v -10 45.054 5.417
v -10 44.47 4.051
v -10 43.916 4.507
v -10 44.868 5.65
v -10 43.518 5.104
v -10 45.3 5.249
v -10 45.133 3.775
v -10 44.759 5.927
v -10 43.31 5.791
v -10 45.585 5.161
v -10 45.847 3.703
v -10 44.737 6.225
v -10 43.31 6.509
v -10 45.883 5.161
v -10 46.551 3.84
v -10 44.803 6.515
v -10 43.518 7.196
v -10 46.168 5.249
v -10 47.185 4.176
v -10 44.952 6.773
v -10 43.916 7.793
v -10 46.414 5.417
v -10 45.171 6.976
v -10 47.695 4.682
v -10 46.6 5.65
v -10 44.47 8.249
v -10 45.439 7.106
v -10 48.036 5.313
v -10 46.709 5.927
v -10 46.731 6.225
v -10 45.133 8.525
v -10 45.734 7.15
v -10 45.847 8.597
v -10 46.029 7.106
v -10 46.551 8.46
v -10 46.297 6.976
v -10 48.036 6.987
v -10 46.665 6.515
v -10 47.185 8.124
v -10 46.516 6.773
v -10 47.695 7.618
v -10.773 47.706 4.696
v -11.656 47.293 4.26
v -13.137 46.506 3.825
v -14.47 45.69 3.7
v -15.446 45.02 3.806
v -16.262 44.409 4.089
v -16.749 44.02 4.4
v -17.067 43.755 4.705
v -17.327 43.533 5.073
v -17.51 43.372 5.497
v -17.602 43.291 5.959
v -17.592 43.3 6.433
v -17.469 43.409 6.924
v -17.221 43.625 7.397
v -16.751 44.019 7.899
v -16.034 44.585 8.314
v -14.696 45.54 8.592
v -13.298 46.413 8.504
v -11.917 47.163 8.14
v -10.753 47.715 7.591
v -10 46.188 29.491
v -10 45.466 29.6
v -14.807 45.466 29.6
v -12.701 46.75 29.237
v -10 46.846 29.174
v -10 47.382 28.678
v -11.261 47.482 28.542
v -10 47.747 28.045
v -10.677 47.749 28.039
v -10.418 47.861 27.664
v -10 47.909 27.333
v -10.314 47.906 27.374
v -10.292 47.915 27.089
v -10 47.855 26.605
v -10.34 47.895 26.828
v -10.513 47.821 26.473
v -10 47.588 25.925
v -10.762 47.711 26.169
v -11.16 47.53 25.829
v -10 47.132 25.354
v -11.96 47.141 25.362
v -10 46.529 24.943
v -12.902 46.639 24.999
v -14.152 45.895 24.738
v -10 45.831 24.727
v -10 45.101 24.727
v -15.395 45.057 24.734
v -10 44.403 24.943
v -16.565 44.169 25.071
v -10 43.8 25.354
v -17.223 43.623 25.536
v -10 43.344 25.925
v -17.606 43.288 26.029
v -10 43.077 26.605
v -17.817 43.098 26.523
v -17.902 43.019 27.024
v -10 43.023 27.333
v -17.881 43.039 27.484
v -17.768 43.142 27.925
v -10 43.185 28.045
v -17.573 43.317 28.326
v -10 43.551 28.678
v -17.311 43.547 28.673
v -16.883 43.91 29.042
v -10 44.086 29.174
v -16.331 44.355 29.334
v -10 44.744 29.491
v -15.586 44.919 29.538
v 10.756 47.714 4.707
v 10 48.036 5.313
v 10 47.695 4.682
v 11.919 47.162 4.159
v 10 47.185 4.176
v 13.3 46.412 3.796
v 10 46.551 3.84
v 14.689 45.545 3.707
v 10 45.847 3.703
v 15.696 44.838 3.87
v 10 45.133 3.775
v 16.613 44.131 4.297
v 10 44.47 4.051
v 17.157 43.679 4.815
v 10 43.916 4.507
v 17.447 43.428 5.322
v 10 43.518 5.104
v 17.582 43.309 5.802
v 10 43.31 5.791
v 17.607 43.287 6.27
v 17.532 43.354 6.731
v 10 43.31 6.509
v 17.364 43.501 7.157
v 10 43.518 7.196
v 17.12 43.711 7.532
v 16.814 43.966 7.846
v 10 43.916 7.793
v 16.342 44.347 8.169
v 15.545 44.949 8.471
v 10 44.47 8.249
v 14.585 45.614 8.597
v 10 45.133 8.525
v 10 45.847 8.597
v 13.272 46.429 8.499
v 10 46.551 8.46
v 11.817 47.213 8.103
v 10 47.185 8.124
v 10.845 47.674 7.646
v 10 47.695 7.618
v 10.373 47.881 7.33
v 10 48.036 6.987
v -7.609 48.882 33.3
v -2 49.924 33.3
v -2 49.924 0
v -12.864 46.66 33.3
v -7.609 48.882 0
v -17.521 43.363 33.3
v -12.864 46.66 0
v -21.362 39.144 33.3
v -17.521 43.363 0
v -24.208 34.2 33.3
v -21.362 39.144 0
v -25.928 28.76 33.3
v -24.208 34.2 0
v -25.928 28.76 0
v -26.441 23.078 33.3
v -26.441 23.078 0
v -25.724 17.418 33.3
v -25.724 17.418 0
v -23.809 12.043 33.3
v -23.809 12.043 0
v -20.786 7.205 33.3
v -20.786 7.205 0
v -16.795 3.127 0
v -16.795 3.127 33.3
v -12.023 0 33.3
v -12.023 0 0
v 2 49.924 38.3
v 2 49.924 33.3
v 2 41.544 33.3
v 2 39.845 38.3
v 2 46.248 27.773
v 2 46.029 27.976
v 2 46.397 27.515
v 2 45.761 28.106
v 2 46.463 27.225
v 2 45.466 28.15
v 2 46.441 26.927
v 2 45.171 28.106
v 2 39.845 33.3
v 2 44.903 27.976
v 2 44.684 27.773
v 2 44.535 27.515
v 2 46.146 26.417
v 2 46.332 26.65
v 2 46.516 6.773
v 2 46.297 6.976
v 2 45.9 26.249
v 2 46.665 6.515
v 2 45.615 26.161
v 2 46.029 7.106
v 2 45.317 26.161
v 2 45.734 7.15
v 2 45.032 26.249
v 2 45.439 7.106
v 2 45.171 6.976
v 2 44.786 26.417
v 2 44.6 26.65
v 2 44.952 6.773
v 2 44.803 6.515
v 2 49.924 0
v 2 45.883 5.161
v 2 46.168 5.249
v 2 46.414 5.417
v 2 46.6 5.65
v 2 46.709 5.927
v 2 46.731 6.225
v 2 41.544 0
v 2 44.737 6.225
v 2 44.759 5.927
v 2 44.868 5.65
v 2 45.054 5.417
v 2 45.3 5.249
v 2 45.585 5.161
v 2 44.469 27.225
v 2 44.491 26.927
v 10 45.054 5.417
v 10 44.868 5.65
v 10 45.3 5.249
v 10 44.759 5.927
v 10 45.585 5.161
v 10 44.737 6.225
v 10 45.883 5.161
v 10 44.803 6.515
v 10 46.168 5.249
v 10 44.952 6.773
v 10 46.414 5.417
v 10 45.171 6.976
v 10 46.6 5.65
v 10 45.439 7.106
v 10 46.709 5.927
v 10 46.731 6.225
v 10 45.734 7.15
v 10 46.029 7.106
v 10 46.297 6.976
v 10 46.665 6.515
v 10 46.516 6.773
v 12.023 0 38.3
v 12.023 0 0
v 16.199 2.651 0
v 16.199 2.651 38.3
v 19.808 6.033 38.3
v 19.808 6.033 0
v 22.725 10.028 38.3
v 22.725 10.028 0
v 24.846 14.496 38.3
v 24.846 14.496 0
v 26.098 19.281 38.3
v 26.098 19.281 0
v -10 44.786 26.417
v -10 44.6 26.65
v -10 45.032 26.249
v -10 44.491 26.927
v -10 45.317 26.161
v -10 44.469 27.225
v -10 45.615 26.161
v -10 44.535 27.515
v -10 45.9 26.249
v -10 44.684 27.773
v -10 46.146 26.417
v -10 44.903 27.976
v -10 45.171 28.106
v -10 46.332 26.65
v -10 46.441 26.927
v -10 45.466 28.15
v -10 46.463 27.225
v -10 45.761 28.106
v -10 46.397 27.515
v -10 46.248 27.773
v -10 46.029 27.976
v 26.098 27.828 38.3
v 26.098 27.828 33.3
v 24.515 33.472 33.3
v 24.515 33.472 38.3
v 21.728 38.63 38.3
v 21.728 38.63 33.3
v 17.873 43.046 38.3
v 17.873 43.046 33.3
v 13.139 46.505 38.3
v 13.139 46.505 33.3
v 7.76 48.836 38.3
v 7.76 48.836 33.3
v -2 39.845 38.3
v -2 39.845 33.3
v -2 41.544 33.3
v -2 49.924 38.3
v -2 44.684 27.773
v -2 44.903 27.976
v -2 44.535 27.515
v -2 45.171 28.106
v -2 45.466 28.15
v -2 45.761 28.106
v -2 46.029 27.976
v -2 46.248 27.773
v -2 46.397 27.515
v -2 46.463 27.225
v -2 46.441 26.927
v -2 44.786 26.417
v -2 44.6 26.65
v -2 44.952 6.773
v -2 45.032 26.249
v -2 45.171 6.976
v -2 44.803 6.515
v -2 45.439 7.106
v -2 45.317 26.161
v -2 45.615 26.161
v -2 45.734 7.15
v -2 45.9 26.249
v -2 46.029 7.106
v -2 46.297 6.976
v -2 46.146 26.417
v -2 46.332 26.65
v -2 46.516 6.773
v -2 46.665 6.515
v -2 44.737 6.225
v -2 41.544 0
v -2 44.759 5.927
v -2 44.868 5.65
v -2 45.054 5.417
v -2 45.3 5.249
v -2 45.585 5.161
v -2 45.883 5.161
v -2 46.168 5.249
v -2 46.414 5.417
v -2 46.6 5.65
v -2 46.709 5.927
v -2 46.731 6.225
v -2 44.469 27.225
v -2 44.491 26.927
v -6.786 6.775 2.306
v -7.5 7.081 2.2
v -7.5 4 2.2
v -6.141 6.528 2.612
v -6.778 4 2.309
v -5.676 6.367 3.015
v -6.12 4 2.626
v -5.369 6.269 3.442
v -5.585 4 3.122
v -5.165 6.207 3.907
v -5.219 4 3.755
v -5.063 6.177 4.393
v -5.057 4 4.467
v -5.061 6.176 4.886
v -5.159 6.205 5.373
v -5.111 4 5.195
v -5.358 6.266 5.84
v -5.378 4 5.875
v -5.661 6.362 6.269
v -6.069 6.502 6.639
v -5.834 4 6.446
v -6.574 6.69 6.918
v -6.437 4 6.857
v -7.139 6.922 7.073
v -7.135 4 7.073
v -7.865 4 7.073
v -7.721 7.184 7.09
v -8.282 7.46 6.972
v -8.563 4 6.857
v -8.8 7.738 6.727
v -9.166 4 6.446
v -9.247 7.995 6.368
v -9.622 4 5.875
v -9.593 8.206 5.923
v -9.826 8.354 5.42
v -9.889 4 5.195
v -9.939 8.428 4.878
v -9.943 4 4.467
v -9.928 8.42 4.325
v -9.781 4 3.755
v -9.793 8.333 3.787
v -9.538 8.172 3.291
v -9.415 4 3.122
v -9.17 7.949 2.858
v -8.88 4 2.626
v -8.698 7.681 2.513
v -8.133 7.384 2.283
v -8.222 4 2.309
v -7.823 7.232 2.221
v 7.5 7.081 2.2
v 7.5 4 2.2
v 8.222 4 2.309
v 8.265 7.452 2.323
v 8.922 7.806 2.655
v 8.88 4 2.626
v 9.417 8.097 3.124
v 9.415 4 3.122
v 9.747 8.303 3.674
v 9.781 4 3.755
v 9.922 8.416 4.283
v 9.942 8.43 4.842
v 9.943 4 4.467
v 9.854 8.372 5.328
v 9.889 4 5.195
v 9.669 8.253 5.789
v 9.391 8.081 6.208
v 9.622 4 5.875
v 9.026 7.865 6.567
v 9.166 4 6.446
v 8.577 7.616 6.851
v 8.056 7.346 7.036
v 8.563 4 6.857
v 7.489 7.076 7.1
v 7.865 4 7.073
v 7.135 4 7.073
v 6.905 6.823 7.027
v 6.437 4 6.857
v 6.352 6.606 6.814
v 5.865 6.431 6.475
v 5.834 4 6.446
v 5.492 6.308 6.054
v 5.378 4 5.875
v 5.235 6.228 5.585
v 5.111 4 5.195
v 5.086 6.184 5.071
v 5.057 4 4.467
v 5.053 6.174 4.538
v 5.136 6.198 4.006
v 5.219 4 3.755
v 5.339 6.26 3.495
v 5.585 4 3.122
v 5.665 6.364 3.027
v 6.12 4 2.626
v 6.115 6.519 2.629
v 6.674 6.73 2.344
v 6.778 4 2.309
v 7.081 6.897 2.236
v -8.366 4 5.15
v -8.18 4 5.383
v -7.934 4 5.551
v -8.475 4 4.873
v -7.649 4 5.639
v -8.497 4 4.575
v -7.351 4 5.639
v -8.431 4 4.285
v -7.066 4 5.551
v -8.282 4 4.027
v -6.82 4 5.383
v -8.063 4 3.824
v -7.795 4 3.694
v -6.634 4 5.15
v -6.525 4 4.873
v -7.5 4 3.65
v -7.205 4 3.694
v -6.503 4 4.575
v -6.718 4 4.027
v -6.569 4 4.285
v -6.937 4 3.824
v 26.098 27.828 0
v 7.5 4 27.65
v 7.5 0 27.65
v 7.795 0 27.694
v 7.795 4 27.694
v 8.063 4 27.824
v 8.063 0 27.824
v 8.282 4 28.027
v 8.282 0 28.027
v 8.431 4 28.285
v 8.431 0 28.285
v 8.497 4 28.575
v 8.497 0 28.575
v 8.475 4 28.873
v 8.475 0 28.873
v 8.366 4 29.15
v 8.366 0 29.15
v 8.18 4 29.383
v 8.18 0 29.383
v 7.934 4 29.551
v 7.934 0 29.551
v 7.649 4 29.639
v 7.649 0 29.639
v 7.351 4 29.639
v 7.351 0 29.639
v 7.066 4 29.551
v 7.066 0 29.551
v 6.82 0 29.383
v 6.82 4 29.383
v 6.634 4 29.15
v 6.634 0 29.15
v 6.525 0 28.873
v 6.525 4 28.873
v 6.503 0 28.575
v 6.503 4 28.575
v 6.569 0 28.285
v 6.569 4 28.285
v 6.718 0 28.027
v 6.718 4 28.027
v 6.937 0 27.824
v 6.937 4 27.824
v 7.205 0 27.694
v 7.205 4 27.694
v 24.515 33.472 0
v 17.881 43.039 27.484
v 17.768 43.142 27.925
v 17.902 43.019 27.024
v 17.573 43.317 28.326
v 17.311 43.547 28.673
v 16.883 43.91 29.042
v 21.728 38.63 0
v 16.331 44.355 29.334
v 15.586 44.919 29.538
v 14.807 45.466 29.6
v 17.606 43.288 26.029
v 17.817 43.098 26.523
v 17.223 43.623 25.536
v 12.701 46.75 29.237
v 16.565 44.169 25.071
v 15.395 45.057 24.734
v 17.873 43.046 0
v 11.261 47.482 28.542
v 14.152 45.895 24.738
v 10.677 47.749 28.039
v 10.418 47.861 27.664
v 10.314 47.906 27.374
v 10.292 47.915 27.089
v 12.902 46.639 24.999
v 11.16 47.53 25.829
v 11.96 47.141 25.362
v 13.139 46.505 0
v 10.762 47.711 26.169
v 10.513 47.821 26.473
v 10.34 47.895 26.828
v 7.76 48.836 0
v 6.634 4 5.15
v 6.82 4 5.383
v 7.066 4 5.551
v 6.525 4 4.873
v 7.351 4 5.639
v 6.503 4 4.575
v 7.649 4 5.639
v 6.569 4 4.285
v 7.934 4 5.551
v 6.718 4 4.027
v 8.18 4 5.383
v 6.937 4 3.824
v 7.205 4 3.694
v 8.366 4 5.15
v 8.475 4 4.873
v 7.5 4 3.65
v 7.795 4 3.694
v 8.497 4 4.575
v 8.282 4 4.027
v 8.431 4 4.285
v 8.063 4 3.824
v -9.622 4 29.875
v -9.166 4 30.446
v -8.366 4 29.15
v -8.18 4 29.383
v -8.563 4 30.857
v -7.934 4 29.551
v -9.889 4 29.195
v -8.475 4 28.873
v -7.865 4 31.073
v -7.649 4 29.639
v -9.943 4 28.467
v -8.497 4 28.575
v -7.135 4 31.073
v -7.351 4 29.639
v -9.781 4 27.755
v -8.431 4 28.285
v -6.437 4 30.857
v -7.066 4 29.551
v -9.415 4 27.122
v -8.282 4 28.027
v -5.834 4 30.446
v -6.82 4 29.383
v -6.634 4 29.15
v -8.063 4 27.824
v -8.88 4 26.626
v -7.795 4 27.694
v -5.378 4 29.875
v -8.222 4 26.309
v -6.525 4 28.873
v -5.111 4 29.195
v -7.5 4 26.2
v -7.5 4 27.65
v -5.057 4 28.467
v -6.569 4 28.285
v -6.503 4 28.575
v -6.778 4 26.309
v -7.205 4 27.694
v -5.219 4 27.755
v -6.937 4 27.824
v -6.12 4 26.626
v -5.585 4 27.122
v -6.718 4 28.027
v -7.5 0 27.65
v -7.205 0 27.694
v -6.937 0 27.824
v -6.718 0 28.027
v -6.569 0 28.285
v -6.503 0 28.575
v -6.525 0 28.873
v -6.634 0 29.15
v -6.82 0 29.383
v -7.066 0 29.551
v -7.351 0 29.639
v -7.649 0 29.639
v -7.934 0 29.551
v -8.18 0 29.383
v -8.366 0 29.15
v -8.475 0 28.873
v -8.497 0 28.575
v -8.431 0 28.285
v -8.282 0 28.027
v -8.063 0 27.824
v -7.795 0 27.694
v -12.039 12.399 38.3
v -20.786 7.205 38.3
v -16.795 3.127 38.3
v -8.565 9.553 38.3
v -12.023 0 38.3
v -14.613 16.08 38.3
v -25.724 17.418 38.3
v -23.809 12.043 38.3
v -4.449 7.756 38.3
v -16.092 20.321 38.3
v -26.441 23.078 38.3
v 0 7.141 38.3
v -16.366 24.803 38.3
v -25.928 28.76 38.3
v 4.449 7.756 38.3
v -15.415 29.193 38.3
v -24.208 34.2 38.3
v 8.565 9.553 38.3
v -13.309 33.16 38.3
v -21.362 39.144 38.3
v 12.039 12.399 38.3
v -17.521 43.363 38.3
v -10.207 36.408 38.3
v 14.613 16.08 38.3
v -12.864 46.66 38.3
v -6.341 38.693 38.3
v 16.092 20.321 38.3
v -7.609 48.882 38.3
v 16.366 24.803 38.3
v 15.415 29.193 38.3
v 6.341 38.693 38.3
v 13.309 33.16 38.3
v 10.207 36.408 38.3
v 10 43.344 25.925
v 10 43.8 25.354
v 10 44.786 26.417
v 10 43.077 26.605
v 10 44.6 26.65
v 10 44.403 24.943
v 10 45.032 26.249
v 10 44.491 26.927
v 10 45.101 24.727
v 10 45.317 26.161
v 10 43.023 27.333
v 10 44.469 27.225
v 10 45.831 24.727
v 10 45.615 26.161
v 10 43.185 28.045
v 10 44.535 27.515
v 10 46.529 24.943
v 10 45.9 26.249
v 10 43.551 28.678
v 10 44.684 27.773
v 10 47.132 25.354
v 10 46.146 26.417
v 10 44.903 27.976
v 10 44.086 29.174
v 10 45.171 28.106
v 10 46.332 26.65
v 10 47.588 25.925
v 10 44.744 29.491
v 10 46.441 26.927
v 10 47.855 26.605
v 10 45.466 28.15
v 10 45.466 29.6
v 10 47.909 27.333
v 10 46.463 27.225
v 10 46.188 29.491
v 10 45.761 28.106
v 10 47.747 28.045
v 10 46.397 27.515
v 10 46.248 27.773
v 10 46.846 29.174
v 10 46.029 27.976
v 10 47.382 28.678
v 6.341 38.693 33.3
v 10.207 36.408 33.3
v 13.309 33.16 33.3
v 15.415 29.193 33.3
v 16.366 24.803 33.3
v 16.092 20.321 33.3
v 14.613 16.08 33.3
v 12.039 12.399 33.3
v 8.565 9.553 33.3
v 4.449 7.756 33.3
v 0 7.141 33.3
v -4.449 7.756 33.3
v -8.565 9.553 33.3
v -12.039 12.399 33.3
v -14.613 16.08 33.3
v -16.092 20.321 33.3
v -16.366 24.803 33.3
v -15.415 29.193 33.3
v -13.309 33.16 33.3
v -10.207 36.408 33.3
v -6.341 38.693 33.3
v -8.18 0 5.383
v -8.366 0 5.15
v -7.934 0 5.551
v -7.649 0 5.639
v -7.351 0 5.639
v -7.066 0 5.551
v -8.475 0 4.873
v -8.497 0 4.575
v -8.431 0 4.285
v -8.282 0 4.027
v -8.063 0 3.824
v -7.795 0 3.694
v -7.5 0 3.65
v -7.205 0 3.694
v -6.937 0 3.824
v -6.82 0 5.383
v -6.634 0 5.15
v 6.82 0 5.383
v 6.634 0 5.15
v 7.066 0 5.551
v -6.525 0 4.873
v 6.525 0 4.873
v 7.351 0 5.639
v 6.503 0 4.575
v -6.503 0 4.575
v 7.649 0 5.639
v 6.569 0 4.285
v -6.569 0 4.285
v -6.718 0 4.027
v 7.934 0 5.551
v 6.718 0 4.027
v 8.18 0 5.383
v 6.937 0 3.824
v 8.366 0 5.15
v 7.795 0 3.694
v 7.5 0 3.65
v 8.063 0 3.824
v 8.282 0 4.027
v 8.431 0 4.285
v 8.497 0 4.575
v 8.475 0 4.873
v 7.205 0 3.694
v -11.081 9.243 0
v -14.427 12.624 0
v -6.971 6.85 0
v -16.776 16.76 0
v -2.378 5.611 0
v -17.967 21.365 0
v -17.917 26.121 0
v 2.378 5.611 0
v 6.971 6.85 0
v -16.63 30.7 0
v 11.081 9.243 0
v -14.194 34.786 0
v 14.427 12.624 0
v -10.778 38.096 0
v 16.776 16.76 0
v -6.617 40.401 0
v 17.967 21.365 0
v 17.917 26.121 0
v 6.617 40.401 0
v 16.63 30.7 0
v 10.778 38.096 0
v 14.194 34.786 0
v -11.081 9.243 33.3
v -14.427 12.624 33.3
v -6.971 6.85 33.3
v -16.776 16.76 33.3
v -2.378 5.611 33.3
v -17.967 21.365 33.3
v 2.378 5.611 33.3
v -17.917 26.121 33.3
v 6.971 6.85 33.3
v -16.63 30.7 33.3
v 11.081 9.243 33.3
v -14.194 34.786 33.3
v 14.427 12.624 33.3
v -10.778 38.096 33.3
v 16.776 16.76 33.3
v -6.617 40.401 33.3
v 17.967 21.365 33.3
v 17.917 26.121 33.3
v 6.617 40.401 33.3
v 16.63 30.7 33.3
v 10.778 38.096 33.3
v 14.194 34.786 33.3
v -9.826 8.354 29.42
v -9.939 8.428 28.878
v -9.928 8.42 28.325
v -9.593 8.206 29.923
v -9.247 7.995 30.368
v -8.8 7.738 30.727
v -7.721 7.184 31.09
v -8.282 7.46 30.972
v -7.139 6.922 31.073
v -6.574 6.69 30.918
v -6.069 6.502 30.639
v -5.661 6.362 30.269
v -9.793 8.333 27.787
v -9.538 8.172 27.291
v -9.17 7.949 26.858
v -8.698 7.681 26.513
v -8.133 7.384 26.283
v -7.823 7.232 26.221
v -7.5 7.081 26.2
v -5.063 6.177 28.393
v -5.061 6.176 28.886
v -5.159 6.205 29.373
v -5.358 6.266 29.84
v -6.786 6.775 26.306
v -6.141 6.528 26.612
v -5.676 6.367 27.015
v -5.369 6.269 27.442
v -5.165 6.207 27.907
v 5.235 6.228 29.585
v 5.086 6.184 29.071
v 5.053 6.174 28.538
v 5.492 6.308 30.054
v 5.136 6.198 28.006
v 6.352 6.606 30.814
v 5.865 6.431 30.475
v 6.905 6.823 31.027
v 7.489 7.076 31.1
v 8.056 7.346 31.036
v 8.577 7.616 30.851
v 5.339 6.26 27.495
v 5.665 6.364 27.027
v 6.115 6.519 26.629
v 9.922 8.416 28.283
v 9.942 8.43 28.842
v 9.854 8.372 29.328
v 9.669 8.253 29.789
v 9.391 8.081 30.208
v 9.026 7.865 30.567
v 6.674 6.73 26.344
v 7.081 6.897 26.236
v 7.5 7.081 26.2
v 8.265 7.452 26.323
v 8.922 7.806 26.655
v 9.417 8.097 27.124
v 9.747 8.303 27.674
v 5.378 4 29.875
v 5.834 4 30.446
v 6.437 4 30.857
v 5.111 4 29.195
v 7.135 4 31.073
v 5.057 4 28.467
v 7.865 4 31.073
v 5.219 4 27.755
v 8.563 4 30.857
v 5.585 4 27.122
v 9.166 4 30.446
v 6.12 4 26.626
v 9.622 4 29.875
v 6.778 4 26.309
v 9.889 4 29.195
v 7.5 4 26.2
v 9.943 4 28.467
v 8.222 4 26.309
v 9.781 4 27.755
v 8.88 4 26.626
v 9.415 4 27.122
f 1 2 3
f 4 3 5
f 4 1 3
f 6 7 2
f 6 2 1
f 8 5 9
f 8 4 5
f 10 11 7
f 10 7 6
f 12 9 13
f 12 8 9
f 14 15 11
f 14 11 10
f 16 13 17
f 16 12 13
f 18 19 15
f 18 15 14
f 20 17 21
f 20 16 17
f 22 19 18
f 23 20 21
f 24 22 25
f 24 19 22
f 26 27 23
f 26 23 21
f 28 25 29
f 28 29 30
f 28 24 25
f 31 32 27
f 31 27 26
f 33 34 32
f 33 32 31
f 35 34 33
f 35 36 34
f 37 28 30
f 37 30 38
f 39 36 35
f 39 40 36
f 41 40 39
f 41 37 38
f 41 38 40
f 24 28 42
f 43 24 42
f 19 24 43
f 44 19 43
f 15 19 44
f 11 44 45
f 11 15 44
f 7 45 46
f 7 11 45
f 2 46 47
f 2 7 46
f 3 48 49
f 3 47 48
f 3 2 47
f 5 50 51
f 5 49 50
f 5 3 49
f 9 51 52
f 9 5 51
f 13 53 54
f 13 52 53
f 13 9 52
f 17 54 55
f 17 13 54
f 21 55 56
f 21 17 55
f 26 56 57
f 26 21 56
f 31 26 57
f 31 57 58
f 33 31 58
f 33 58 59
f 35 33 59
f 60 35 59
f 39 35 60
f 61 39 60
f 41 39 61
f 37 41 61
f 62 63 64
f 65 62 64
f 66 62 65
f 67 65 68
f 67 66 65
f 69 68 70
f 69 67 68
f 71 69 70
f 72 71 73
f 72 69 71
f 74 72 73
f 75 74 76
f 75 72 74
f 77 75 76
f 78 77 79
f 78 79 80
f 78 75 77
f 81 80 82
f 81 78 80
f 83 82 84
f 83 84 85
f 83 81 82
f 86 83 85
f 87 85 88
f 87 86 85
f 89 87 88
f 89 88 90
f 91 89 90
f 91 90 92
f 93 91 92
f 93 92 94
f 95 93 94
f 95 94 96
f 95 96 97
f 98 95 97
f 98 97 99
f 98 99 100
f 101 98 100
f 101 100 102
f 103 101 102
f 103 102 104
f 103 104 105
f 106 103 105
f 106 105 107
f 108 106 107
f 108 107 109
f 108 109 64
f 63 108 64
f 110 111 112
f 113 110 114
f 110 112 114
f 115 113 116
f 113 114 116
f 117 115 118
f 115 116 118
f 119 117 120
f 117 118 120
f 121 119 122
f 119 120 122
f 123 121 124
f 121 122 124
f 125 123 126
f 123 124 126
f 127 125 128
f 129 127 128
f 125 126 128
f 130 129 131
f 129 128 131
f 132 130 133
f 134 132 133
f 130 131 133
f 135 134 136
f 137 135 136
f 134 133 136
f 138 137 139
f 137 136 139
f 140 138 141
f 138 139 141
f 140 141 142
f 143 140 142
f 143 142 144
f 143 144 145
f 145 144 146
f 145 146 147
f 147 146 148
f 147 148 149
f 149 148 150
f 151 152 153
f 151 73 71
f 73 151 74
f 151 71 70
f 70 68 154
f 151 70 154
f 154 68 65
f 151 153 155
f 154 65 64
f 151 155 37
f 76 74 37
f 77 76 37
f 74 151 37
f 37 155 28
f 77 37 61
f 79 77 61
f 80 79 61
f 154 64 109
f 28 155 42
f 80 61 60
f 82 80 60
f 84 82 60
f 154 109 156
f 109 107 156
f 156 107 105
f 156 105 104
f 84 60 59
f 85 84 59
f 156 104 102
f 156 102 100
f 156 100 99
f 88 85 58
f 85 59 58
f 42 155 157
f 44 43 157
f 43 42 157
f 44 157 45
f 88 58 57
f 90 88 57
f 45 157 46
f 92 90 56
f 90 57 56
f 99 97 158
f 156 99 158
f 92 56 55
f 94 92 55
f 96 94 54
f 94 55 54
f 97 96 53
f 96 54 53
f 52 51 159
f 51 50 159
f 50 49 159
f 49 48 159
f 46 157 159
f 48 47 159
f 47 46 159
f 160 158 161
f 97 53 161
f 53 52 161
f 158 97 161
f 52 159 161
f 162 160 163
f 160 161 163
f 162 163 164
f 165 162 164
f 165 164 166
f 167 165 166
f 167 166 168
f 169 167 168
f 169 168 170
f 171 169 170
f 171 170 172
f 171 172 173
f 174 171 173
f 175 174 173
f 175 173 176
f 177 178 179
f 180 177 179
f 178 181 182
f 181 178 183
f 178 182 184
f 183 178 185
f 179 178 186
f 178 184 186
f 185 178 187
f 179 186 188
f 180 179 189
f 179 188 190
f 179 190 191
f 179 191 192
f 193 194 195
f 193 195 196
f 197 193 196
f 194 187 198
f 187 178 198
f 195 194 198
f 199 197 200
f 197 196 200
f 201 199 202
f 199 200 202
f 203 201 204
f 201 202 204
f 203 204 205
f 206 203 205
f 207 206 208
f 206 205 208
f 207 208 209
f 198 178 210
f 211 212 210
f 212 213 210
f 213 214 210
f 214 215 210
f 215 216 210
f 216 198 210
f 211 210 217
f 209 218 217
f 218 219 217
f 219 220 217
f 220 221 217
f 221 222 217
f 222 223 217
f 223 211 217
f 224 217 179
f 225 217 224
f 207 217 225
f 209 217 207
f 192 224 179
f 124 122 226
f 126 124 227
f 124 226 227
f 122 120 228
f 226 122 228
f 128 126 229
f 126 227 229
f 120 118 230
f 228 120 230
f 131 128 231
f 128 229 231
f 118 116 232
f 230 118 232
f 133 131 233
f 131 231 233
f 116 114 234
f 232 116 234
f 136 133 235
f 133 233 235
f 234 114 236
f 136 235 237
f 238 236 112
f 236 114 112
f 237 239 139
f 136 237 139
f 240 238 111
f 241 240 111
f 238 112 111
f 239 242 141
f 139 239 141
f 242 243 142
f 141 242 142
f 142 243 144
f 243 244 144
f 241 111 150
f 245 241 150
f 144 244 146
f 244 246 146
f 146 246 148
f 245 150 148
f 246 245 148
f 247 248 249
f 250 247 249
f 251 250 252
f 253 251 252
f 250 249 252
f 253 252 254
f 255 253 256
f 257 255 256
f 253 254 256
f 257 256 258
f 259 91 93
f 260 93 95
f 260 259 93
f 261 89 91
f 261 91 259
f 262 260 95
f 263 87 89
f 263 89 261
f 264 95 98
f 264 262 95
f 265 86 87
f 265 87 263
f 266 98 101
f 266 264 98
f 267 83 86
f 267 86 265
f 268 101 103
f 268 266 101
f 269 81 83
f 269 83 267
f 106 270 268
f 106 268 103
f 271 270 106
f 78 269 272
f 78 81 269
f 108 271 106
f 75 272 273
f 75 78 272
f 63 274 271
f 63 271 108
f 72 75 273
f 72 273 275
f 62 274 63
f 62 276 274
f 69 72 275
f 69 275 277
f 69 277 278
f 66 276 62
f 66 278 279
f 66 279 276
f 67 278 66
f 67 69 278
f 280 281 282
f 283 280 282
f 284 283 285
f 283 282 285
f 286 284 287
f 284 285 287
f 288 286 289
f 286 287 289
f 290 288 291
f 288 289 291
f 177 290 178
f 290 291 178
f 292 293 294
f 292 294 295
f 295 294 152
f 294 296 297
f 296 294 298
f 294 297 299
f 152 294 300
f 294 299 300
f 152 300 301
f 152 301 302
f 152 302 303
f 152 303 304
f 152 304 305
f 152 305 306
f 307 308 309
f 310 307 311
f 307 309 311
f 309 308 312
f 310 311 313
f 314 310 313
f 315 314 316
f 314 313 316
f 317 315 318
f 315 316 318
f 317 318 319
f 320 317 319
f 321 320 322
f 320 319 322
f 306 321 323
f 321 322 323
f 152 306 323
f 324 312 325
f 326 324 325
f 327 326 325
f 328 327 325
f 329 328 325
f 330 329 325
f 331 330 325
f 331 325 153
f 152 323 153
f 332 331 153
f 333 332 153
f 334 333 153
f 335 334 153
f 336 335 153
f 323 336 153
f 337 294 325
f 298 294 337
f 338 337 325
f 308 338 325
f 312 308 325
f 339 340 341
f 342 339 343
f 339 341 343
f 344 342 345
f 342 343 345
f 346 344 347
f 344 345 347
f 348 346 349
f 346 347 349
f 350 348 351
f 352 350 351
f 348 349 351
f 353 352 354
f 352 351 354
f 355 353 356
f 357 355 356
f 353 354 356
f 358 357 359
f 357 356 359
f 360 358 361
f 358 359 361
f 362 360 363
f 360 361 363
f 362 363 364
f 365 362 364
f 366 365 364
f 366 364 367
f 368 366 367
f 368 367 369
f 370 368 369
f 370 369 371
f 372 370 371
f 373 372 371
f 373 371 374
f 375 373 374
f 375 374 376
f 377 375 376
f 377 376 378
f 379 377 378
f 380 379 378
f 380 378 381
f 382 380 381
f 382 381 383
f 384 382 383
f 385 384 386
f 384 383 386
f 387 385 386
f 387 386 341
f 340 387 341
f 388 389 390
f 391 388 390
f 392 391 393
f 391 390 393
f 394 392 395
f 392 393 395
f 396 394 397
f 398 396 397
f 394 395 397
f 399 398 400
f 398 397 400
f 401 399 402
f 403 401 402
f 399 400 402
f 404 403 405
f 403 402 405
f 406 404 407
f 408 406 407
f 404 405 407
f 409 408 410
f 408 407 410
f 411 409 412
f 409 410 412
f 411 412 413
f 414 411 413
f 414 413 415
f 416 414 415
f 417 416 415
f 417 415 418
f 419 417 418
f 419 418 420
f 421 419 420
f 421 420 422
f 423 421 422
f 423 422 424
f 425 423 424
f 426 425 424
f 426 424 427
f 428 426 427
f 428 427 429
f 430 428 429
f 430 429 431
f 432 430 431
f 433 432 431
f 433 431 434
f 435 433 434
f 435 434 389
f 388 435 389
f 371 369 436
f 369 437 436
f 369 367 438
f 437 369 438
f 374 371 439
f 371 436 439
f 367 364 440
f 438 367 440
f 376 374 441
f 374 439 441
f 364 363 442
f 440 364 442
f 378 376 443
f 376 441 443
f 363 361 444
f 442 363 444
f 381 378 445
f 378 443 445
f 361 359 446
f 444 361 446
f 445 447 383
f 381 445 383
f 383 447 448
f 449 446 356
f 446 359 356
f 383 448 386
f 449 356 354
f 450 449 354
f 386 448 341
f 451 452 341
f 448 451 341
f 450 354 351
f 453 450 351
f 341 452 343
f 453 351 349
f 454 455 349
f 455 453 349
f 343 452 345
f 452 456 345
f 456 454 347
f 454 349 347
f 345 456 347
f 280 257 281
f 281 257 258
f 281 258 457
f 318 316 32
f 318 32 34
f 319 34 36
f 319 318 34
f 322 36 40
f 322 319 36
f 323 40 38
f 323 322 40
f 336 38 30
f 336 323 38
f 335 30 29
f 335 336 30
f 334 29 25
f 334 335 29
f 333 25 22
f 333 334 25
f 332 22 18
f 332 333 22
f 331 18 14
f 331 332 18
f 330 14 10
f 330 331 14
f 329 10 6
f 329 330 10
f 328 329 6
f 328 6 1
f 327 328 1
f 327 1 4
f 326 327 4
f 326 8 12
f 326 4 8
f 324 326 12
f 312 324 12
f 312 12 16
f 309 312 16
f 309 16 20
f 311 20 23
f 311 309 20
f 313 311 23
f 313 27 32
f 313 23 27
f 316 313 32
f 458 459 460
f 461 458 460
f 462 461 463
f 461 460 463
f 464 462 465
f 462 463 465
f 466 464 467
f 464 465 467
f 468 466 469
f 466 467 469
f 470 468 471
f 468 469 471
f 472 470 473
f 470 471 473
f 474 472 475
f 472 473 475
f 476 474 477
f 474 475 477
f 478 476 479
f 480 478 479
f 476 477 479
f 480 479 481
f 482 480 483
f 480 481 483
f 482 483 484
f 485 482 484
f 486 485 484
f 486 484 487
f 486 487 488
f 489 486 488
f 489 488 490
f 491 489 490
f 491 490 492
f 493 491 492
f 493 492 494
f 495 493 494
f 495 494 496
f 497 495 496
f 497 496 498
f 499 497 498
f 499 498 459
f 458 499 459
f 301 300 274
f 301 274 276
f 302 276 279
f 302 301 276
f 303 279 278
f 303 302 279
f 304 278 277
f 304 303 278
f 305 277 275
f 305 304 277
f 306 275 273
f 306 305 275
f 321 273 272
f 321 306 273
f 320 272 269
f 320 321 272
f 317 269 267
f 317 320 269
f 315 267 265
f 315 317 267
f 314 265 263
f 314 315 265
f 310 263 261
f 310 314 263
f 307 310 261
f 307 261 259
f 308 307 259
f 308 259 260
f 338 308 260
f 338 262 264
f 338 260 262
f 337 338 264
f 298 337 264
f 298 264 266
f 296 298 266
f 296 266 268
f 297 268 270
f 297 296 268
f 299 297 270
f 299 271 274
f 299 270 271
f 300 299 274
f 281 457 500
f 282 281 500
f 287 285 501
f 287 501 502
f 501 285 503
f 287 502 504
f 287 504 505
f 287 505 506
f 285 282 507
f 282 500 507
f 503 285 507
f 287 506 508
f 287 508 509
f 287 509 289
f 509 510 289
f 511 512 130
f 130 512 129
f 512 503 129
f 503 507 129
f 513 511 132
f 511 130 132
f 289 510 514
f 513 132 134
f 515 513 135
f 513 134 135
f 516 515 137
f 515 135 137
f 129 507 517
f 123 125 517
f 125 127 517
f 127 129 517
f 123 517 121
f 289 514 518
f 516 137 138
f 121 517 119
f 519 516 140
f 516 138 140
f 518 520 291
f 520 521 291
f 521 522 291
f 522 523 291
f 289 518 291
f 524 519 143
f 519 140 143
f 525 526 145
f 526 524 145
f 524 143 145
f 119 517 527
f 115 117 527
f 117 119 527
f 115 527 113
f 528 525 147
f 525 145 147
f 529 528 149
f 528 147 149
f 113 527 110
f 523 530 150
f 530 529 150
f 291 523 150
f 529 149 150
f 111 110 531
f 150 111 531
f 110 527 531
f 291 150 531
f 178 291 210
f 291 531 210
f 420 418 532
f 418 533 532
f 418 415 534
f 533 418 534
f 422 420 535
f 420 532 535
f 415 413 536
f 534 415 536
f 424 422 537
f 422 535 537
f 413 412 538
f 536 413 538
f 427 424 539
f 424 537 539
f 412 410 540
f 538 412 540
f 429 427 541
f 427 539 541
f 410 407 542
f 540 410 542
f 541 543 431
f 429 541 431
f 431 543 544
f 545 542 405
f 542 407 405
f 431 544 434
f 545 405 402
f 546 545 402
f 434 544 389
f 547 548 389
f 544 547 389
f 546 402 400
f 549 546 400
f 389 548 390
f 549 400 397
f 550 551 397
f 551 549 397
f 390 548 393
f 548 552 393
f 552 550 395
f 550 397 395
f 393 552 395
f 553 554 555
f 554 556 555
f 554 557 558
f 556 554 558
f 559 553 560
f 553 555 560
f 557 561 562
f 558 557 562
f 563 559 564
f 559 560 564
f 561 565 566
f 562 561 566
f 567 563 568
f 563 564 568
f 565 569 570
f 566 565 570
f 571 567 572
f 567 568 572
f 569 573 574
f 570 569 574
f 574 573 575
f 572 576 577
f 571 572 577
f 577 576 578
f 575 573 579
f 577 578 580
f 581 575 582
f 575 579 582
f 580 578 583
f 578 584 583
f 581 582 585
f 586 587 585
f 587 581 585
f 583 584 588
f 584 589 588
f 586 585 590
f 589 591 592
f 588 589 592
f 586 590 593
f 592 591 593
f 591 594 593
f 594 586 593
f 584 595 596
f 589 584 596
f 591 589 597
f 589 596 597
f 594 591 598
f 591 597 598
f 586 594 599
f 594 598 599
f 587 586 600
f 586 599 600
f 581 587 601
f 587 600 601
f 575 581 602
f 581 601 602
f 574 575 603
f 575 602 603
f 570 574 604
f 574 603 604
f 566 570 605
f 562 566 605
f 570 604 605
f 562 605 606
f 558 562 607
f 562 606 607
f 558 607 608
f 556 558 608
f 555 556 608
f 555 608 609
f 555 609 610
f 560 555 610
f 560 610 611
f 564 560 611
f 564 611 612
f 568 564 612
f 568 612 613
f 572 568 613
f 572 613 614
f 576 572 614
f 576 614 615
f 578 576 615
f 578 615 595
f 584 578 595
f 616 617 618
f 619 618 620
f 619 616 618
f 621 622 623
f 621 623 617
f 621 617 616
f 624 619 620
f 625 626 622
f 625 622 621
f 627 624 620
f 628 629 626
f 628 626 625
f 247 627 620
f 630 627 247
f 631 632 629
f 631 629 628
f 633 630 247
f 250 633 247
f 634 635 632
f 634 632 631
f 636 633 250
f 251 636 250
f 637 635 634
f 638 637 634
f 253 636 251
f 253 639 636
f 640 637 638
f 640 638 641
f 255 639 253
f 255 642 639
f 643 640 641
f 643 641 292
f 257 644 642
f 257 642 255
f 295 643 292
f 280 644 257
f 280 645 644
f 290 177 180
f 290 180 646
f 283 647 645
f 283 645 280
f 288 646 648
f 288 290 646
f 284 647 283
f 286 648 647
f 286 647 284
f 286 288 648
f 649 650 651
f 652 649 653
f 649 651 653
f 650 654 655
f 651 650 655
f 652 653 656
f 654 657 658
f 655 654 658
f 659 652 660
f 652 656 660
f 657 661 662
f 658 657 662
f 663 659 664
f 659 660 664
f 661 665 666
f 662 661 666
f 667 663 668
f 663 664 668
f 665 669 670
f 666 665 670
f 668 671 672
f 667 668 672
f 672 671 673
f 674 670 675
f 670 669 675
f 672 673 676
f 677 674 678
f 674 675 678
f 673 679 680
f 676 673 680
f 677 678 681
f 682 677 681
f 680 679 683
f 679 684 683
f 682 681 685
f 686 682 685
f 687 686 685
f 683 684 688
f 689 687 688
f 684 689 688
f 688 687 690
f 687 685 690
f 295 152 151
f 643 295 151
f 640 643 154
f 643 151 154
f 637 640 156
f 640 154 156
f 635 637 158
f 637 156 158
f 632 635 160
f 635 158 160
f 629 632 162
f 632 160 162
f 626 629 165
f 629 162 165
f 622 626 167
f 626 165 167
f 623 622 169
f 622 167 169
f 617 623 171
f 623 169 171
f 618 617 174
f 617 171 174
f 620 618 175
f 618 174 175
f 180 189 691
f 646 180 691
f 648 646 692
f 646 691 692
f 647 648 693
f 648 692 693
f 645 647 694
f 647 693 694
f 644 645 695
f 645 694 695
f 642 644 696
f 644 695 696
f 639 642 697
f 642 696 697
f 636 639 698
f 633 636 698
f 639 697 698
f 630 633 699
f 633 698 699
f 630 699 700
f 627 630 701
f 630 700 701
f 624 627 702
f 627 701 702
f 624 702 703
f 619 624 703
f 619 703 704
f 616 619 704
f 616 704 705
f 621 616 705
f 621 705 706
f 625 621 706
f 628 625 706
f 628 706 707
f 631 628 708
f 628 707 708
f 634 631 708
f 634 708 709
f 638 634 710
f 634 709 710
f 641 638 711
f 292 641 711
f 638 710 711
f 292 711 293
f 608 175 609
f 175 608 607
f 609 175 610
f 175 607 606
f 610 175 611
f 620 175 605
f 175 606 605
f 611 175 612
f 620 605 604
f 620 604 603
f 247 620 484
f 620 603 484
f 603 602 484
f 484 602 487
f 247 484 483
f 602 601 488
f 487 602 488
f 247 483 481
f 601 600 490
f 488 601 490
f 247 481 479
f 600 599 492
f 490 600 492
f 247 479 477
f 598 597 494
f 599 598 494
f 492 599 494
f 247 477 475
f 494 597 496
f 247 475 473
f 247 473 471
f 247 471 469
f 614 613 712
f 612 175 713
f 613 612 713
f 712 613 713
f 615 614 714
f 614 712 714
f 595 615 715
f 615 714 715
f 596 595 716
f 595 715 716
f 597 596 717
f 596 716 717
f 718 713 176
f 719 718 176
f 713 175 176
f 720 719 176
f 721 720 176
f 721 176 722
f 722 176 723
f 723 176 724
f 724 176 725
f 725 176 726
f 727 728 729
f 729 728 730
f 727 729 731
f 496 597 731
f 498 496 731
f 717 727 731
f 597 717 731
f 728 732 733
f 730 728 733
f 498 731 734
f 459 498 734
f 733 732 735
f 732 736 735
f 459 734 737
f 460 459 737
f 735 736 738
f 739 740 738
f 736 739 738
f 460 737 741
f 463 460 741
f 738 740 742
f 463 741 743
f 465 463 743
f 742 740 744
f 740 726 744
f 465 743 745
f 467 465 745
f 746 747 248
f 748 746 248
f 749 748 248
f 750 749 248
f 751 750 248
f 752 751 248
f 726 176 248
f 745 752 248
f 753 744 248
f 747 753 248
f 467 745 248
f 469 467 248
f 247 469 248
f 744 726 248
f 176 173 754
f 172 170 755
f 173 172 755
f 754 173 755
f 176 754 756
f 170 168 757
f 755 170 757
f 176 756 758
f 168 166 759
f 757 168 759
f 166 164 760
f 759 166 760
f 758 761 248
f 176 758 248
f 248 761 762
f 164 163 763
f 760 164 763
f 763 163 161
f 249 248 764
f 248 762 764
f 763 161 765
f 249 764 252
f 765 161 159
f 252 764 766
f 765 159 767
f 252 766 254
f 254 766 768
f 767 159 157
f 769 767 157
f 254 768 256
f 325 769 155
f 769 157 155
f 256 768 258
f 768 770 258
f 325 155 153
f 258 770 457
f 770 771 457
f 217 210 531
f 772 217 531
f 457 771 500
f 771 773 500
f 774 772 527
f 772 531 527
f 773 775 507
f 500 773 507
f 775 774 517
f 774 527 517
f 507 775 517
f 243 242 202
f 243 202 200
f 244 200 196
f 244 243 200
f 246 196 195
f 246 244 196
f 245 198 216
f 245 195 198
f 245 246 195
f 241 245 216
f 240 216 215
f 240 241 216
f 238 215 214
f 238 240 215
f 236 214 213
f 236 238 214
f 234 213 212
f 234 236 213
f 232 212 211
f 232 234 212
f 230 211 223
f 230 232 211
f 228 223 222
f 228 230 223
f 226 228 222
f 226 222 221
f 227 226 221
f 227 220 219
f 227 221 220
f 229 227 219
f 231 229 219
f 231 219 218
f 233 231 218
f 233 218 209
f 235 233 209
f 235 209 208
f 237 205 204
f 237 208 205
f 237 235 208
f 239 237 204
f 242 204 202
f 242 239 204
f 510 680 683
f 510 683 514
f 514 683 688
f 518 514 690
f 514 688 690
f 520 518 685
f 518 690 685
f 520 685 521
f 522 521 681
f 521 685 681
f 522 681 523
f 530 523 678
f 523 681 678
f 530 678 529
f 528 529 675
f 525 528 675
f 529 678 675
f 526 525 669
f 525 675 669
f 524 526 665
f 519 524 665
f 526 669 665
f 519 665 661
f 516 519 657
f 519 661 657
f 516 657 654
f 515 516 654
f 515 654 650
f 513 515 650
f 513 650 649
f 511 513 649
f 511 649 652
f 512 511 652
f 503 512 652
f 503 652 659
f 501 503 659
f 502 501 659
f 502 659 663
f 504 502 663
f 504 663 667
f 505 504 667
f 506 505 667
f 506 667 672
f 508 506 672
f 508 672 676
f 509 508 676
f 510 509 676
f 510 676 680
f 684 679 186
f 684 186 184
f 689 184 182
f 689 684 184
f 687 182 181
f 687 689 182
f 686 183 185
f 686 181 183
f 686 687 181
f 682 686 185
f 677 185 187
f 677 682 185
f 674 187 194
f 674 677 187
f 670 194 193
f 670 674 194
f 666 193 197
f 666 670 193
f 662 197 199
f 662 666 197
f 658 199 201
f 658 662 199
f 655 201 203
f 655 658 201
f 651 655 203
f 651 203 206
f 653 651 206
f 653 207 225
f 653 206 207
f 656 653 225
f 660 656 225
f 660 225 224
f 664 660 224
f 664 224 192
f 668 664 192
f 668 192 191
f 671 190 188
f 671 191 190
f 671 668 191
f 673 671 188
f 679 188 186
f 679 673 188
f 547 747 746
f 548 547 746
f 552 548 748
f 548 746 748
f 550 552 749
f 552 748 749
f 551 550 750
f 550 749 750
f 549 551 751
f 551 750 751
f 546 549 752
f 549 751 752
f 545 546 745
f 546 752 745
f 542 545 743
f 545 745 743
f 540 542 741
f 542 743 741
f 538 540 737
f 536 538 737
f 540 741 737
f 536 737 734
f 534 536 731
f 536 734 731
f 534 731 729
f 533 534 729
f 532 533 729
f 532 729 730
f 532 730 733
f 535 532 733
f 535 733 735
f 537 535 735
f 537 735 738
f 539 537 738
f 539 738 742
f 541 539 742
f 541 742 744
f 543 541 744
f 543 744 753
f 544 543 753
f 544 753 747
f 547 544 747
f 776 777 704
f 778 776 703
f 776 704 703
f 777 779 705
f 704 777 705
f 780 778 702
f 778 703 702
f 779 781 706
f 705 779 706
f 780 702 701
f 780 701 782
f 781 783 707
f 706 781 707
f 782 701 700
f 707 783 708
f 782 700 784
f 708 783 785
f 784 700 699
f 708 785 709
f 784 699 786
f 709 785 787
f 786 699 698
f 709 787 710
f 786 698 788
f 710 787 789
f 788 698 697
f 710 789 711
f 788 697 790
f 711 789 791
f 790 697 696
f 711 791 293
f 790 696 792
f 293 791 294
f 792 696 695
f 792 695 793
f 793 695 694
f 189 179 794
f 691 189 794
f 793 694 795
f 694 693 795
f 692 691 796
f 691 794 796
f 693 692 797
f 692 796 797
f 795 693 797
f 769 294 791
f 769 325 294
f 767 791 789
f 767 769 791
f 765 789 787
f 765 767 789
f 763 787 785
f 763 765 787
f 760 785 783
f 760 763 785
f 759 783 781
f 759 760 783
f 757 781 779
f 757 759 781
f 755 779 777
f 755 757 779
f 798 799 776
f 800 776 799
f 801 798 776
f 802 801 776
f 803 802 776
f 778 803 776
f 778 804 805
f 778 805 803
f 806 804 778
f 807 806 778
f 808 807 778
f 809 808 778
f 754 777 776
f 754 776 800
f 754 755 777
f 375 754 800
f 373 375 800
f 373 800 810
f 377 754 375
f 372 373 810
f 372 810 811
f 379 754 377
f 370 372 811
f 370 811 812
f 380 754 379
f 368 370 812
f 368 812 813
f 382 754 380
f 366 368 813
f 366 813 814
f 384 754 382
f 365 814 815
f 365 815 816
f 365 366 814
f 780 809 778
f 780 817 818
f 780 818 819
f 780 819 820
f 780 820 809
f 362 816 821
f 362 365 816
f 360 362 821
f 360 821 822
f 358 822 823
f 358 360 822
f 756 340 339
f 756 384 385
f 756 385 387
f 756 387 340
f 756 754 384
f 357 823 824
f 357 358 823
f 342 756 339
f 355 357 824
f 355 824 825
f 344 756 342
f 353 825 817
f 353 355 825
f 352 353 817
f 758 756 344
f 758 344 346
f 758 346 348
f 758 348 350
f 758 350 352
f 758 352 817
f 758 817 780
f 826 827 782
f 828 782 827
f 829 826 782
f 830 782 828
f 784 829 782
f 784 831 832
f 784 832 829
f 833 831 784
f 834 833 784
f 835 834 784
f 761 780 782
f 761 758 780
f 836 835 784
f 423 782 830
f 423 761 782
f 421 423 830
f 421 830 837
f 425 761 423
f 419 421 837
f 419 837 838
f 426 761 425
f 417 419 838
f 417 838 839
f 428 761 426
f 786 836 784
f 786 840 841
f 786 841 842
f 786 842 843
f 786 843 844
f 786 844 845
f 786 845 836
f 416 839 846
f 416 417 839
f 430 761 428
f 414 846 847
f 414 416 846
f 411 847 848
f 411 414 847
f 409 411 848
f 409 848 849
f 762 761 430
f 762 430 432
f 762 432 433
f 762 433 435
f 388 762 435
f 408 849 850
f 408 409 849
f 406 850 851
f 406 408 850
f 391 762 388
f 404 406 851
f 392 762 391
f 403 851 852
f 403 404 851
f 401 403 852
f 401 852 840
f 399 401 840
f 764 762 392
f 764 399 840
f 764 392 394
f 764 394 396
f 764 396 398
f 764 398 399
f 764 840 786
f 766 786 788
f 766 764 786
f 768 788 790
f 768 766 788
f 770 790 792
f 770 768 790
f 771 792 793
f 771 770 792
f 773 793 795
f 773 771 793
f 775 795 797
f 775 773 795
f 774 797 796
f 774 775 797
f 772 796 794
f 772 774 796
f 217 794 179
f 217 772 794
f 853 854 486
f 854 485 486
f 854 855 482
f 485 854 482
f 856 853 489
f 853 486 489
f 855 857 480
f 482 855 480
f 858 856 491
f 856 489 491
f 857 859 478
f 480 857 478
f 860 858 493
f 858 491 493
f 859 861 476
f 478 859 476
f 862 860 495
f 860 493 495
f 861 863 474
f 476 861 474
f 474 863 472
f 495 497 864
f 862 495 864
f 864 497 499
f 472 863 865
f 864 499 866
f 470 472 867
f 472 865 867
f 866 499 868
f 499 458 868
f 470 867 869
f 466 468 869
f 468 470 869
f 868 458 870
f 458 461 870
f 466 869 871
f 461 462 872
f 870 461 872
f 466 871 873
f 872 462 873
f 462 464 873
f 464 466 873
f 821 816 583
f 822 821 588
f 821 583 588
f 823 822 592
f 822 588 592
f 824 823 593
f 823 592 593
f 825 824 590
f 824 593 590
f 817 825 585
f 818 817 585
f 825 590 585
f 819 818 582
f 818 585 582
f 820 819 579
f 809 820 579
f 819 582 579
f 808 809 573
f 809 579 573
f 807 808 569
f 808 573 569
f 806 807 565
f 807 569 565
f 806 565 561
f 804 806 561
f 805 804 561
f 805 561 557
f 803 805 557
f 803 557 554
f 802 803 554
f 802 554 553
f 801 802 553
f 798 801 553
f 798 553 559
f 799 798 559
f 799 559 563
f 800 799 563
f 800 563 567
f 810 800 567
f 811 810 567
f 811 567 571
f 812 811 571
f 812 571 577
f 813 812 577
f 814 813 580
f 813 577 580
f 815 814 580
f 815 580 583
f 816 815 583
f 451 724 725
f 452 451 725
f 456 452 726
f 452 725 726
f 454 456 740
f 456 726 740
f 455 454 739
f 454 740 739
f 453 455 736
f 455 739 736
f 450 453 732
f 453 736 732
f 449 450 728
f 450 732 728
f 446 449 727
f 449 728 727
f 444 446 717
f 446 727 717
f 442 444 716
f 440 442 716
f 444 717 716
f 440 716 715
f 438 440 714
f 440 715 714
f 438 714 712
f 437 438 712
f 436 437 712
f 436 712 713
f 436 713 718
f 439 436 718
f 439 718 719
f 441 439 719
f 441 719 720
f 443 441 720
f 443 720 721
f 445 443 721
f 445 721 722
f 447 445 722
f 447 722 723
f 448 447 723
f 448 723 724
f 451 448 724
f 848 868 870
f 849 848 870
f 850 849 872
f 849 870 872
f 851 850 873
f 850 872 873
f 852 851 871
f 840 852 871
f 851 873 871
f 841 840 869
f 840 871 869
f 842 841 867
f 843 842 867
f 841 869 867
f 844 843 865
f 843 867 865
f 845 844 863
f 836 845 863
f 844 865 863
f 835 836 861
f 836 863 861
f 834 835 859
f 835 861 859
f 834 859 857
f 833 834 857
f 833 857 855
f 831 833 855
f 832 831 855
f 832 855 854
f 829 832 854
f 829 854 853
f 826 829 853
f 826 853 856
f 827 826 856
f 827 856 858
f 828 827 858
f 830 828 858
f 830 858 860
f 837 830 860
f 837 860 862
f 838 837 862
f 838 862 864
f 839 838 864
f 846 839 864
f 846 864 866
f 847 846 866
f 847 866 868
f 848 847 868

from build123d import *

# Parameters (mm, degrees)
SKETCH1_R               = 18.1
BOSS_EXTRUDE1_DEPTH     = 33.3
SKETCH2_R               = 1
CUT_EXTRUDE1_DEPTH      = 9.3
SKETCH3_R               = 2.45
CUT_EXTRUDE2_DEPTH      = 9.3
SKETCH4_W               = 4
SKETCH4_H               = 29.158742143
CUT_EXTRUDE3_DEPTH      = 66.637335137
CUT_EXTRUDE4_DEPTH      = 67.411402336
CUT_EXTRUDE4_DEPTH_BACK = 67.411402336
SKETCH5_R               = 1
SKETCH6_R               = 2.45
CUT_EXTRUDE5_DEPTH      = 22
BOSS_EXTRUDE2_DEPTH     = 5


with BuildPart() as part:
    # Sketch1 → Boss-Extrude1 (new body)
    with BuildSketch(Plane.XY):
        with BuildLine():
            ThreePointArc((26.098059899, 27.8276923), (-15.592298008, 44.914409405), (-12.023310526, 0))
            Line((-12.023310526, 0), (12.023310526, 0))
            ThreePointArc((12.023310526, 0), (21.360009365, 7.962102032), (26.098059899, 19.28110778))
            Line((26.098059899, 19.28110778), (26.098059899, 27.8276923))
        make_face()
        with Locations((0, 23.55440004)):
            Circle(SKETCH1_R, mode=Mode.SUBTRACT)
    extrude(amount=BOSS_EXTRUDE1_DEPTH)

    # Sketch2 → Cut-Extrude1 (cut)
    with BuildSketch(Plane.XZ):
        with Locations(Location((-7.5, 28.65, 0), (0, 0, 270))):
            Circle(SKETCH2_R)
        with Locations(Location((7.5, 28.65, 0), (0, 0, 270))):
            Circle(SKETCH2_R)
        with Locations(Location((-7.5, 4.65, 0), (0, 0, 270))):
            Circle(SKETCH2_R)
        with Locations(Location((7.5, 4.65, 0), (0, 0, 270))):
            Circle(SKETCH2_R)
    extrude(amount=-CUT_EXTRUDE1_DEPTH, mode=Mode.SUBTRACT)

    # Sketch3 → Cut-Extrude2 (cut)
    with BuildSketch(Plane(origin=(0, 4, 0), x_dir=(-1, 0, 0), z_dir=(0, -1, 0))):
        with Locations(Location((-7.5, -4.65, 0), (0, 0, 90))):
            Circle(SKETCH3_R)
        with Locations(Location((7.5, -4.65, 0), (0, 0, 90))):
            Circle(SKETCH3_R)
        with Locations(Location((-7.5, -28.65, 0), (0, 0, 90))):
            Circle(SKETCH3_R)
        with Locations(Location((7.5, -28.65, 0), (0, 0, 90))):
            Circle(SKETCH3_R)
    extrude(amount=-CUT_EXTRUDE2_DEPTH, mode=Mode.SUBTRACT)

    # Sketch4 → Cut-Extrude3 (cut, through all)
    with BuildSketch(Plane.XY.offset(33.3)):
        with Locations((0, 46.869056607)):
            Rectangle(SKETCH4_W, SKETCH4_H)
    extrude(amount=-CUT_EXTRUDE3_DEPTH, mode=Mode.SUBTRACT)

    # Sketch5 → Cut-Extrude4 (cut, two sides: drawn at the far end of the back side and taken through both)
    with BuildSketch(Plane.ZY.offset(-2).offset(-CUT_EXTRUDE4_DEPTH_BACK)):
        with Locations((6.15, 45.733914025)):
            Circle(SKETCH5_R)
        with Locations((27.15, 45.466040673)):
            Circle(SKETCH5_R)
    extrude(amount=CUT_EXTRUDE4_DEPTH + CUT_EXTRUDE4_DEPTH_BACK, mode=Mode.SUBTRACT)

    # Sketch6 → Cut-Extrude5 (cut)
    with BuildSketch(Plane.ZY.offset(-10)):
        with Locations((6.15, 45.733914025)):
            Circle(SKETCH6_R)
        with Locations((27.15, 45.466040673)):
            Circle(SKETCH6_R)
    cut_extrude5 = extrude(amount=-CUT_EXTRUDE5_DEPTH, mode=Mode.SUBTRACT)

    # Mirror1: Cut-Extrude5 across plane
    add(cut_extrude5.mirror(Plane(origin=(0, 0, 0), x_dir=(0, 0, 1), z_dir=(1, 0, 0))), mode=Mode.SUBTRACT)

    # Sketch7 → Boss-Extrude2 (add)
    with BuildSketch(Plane(origin=(0, 0, 33.3), x_dir=(-1, 0, 0), z_dir=(0, 0, -1))):
        with BuildLine():
            Line((-26.098059899, 19.28110778), (-26.098059899, 27.8276923))
            ThreePointArc((-26.098059899, 27.8276923), (-17.872880838, 43.046190307), (-2, 49.924264606))
            Line((-2, 49.924264606), (-2, 39.845441603))
            ThreePointArc((-2, 39.845441603), (0, 7.141050741), (2, 39.845441603))
            Line((2, 39.845441603), (2, 49.924264606))
            ThreePointArc((2, 49.924264606), (25.928196209, 28.760012261), (12.023310526, 0))
            Line((12.023310526, 0), (-12.023310526, 0))
            ThreePointArc((-12.023310526, 0), (-21.360009365, 7.962102032), (-26.098059899, 19.28110778))
        make_face()
    extrude(amount=-BOSS_EXTRUDE2_DEPTH)


solid = part.part
